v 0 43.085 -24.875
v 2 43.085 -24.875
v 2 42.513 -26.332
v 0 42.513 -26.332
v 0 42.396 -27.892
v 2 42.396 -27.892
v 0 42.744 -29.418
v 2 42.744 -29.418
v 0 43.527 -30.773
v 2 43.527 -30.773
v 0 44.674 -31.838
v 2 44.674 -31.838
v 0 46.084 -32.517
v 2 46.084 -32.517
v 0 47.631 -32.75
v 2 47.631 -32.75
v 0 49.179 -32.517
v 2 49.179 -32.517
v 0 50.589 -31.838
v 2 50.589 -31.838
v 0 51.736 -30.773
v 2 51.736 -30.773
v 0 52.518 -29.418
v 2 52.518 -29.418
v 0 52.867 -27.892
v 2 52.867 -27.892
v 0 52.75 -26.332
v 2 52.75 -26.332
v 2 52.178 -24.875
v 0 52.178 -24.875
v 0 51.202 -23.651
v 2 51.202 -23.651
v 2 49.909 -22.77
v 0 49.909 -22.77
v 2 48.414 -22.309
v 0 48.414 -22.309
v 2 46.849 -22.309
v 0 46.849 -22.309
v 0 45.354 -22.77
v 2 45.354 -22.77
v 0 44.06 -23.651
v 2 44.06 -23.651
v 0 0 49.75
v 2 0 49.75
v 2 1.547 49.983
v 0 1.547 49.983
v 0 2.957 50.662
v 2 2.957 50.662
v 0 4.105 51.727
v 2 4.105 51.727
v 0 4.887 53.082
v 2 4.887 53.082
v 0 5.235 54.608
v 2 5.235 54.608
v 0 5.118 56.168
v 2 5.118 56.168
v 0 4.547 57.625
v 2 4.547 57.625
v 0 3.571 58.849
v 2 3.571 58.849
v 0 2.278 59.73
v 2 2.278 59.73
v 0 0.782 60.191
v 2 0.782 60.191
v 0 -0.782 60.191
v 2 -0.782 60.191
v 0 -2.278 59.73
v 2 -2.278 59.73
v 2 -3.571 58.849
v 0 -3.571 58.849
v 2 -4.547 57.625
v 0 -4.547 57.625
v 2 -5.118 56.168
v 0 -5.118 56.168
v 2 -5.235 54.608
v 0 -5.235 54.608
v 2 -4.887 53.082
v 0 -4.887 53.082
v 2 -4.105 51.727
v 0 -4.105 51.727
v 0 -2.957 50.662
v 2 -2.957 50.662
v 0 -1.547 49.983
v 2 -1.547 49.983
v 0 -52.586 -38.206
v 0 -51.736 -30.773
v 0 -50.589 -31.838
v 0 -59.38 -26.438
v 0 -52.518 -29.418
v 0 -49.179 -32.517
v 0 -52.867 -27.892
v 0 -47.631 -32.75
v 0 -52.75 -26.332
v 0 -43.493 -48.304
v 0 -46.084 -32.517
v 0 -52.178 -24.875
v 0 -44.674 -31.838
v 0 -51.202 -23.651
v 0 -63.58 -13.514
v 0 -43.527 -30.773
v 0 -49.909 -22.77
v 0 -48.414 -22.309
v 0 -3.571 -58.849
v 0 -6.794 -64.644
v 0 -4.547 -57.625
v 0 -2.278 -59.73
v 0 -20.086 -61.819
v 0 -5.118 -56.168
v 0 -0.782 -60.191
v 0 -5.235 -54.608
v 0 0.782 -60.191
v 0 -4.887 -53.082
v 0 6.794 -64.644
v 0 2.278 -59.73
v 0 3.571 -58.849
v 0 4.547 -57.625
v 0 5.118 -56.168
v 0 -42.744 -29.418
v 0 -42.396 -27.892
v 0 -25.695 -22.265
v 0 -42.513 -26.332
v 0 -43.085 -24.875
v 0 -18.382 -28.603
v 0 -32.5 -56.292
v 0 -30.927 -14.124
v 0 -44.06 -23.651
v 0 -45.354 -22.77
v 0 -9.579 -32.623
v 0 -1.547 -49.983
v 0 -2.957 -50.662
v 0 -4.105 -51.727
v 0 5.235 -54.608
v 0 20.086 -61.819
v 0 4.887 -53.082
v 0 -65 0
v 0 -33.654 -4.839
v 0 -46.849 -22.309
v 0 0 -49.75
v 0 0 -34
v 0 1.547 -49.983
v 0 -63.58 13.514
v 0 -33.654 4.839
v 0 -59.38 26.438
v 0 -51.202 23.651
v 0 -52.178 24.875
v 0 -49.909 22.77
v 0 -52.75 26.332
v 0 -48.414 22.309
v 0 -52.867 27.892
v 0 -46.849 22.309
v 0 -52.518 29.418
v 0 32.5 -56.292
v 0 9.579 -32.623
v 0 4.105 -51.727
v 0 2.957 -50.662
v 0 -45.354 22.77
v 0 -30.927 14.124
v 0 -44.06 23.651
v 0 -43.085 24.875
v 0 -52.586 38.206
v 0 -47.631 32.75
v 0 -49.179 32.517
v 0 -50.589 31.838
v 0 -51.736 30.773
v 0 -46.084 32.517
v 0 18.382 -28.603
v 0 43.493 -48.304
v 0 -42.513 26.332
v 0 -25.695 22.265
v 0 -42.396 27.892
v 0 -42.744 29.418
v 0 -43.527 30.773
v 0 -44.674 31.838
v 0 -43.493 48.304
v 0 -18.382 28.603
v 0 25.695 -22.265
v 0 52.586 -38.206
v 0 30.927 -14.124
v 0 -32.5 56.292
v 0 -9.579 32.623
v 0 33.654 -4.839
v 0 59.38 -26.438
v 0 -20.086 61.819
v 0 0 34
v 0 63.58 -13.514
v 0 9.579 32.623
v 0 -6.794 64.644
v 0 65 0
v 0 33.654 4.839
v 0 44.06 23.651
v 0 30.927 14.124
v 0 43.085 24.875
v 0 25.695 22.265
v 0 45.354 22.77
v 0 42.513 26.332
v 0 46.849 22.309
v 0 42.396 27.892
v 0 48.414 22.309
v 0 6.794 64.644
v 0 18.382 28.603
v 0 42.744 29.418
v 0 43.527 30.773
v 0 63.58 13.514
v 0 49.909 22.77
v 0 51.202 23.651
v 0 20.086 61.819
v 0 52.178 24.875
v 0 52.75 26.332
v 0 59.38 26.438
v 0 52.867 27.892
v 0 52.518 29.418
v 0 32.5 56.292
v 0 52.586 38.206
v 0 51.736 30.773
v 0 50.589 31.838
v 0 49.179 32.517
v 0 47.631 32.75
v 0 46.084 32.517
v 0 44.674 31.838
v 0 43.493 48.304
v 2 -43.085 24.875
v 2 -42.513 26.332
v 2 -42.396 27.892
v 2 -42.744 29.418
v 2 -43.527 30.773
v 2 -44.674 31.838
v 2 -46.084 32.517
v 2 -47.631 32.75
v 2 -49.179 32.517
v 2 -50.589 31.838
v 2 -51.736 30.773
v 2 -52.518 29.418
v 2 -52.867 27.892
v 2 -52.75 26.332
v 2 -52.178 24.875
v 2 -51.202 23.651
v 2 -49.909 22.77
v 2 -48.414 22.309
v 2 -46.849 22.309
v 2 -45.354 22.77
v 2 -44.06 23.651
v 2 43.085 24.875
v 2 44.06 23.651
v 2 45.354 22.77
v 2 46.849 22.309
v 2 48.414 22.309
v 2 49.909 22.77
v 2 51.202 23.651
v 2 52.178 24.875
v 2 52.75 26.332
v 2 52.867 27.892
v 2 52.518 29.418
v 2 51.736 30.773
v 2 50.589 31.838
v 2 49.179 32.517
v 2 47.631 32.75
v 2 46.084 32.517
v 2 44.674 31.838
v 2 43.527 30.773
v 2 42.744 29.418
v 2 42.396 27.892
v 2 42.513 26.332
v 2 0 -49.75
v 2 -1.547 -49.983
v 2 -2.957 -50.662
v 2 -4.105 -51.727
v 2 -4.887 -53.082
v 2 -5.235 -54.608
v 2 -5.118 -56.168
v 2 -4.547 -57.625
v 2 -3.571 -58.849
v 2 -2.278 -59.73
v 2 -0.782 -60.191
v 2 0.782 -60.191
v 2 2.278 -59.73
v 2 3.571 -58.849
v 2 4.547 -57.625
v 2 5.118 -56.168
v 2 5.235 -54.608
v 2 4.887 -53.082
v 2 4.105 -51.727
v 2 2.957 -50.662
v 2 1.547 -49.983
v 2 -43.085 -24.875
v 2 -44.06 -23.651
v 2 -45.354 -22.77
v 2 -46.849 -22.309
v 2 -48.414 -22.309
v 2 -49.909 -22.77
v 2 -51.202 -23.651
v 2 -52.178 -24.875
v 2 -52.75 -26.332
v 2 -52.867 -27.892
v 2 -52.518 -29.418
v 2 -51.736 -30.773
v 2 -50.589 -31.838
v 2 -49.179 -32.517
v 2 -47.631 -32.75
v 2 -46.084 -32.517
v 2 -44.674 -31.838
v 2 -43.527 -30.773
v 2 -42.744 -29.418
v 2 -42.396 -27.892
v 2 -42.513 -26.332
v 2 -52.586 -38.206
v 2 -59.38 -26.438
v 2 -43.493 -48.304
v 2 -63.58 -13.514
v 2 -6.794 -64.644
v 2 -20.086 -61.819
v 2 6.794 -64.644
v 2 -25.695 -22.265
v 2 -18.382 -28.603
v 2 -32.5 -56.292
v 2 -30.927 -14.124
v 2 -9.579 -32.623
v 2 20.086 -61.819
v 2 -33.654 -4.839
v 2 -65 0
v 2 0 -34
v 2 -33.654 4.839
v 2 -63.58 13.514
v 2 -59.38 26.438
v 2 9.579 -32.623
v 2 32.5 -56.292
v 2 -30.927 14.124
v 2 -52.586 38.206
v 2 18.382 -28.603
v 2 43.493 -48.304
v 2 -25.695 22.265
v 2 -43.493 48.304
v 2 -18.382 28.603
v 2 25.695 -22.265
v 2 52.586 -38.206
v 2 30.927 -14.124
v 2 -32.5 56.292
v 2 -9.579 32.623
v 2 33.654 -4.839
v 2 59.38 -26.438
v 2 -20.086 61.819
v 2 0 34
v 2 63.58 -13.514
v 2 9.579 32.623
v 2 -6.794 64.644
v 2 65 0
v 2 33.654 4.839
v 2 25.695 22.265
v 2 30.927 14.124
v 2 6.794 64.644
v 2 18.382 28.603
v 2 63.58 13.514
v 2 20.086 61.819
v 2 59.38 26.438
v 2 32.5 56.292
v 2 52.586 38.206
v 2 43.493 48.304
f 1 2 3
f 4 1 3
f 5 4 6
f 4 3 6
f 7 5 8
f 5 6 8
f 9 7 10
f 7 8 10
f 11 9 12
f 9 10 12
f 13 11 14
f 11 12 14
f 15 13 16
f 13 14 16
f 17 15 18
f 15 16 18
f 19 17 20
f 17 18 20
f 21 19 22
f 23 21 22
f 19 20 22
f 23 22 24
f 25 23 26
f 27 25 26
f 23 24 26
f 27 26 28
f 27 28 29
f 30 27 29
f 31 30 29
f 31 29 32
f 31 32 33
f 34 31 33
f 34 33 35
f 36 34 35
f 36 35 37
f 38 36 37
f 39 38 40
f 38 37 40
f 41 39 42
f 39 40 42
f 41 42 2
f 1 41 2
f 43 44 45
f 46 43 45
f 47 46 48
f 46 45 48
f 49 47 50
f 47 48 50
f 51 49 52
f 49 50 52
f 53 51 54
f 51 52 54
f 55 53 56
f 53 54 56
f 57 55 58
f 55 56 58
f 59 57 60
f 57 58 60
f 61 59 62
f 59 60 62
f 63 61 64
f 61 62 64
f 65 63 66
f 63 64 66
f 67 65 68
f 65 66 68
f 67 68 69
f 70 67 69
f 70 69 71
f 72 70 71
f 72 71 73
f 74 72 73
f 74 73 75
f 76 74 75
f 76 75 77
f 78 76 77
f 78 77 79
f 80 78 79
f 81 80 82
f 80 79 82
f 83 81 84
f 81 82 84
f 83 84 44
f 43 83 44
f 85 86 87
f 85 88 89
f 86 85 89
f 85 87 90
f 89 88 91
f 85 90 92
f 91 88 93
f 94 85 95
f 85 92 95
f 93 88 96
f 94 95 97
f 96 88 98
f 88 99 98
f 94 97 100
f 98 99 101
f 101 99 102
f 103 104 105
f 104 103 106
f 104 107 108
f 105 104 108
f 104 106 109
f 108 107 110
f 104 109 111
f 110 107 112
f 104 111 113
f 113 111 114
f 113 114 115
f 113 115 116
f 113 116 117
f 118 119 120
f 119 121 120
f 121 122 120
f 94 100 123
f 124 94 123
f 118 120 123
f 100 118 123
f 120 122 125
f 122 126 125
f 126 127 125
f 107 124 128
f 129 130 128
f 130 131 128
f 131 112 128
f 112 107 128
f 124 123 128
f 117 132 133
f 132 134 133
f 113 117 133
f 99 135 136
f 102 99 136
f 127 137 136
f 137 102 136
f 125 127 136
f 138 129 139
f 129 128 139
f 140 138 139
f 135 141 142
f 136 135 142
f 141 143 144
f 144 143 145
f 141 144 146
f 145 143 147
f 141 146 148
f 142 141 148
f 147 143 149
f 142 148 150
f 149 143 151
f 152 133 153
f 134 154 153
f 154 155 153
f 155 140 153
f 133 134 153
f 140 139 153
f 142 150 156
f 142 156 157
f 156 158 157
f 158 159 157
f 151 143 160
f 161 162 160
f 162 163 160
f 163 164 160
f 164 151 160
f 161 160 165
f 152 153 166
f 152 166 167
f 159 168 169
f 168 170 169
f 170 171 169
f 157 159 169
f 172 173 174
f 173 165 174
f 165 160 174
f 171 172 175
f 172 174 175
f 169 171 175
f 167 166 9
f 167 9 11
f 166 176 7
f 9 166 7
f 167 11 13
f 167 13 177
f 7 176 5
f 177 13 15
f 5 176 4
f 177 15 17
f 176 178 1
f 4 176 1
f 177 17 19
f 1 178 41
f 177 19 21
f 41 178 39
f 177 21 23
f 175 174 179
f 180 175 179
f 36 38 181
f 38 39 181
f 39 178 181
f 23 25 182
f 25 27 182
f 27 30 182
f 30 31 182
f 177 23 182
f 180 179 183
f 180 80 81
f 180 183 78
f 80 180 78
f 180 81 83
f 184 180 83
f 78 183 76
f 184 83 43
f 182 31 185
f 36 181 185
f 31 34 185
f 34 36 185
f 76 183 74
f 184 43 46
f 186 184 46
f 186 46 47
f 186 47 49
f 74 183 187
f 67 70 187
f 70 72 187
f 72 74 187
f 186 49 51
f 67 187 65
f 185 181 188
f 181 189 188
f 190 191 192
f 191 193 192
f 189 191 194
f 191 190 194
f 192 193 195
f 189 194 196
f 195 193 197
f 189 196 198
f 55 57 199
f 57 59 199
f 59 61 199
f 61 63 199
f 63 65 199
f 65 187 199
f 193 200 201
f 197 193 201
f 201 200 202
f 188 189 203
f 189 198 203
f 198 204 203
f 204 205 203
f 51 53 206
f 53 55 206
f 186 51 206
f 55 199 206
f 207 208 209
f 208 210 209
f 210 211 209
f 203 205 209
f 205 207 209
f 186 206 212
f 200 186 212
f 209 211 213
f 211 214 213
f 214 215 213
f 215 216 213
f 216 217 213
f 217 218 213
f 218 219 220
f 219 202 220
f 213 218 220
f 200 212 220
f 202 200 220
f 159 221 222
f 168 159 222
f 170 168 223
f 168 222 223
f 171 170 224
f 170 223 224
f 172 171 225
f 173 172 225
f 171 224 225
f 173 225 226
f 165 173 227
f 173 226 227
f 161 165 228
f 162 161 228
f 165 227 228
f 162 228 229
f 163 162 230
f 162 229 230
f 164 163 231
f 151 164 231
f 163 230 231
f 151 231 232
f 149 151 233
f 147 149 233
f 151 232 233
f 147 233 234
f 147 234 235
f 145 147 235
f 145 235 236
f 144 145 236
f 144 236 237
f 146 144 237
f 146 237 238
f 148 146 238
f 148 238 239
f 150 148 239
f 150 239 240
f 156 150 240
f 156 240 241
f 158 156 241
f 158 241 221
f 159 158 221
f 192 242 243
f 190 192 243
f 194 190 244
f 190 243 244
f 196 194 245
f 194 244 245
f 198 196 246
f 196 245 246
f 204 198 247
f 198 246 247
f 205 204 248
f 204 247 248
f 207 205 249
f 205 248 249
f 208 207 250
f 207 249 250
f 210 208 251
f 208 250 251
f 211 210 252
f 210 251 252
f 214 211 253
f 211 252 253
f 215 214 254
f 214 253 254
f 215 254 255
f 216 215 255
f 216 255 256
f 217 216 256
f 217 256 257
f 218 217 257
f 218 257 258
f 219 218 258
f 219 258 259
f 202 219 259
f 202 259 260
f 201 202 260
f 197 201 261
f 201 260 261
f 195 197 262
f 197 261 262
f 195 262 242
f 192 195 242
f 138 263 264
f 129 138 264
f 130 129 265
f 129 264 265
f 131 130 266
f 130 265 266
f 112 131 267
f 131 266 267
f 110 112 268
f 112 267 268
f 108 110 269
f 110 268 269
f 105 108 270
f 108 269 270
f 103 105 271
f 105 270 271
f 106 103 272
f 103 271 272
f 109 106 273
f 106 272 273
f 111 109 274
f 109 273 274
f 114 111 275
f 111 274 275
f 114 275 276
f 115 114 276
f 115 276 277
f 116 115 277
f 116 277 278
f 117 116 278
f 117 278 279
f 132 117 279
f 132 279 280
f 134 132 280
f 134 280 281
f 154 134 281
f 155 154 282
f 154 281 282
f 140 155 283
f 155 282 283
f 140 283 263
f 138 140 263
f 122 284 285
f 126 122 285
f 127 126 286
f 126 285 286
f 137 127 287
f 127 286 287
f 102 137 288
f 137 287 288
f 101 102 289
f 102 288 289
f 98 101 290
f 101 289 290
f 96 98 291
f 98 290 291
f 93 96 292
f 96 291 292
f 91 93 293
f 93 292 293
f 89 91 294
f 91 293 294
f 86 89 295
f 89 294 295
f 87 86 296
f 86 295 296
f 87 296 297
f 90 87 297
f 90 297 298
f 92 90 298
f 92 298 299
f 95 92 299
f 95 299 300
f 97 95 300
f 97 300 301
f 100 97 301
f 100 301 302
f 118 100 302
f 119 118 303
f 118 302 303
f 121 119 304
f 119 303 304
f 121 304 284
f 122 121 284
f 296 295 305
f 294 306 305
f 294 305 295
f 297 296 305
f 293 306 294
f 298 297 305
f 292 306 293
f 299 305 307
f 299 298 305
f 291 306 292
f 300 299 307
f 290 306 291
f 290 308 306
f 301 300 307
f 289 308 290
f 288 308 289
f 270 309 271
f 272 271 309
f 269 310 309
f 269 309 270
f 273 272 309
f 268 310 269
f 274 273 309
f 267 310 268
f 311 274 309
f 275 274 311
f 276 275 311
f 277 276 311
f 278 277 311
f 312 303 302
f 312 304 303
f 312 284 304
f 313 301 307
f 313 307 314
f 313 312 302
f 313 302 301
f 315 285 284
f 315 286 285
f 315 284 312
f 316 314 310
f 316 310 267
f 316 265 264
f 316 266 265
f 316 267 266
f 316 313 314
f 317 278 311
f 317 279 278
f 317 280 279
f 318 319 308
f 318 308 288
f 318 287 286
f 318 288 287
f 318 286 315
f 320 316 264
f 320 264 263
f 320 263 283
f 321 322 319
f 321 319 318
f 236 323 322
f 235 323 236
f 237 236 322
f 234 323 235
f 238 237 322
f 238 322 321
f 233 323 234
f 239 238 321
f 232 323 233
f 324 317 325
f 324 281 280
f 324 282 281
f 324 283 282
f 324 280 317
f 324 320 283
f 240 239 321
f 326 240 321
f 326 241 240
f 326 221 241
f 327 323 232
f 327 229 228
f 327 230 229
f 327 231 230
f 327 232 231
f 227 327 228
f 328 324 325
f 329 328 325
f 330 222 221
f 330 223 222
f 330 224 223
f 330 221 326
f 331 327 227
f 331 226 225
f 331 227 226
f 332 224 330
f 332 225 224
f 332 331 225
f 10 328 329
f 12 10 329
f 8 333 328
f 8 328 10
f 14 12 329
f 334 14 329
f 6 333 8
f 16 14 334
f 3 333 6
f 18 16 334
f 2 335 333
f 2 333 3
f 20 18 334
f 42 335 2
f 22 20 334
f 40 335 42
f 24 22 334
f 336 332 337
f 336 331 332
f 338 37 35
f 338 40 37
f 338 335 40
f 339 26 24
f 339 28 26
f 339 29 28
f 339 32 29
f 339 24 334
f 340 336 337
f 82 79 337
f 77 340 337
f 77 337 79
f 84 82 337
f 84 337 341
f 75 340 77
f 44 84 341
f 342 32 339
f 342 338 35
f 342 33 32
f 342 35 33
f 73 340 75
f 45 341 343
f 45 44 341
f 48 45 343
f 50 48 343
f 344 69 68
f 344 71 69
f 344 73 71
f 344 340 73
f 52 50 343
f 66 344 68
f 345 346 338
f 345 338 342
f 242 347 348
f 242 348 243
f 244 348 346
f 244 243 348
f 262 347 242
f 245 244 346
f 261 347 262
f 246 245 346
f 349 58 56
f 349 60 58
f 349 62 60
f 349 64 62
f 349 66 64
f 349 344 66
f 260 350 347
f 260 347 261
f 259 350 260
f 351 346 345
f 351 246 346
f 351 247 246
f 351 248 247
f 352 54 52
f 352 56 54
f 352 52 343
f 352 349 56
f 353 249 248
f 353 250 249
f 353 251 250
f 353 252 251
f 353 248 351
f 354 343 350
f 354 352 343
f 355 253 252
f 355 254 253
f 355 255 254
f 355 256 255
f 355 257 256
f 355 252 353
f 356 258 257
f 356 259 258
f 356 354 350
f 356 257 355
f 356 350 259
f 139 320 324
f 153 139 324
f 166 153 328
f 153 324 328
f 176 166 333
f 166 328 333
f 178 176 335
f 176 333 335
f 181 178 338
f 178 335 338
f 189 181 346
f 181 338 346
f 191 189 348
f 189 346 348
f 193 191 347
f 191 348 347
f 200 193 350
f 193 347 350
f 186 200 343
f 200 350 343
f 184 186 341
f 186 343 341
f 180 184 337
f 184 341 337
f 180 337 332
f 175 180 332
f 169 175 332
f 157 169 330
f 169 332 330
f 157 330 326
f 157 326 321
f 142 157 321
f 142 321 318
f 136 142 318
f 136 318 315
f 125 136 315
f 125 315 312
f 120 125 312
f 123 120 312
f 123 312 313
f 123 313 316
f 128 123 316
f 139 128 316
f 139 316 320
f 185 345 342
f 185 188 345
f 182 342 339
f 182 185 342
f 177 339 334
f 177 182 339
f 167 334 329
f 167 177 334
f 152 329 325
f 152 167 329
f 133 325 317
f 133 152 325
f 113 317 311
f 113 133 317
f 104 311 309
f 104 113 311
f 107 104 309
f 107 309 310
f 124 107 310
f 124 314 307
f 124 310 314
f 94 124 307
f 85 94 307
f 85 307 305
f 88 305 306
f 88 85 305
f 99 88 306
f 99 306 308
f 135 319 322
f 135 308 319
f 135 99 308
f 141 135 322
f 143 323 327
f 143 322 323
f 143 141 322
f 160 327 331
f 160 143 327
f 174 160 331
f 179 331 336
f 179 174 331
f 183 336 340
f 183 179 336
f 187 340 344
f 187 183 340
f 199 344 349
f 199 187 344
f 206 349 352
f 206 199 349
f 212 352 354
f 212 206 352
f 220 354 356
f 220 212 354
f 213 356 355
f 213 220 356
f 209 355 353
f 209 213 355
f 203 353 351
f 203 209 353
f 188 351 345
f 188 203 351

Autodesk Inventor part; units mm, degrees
ref_plane "YZ Plane" through (0, 0, 0) normal (1, 0, 0) x (0, 1, 0)
ref_plane "XZ Plane" through (0, 0, 0) normal (0, 1, 0) x (-1, 0, 0)
ref_plane "XY Plane" through (0, 0, 0) normal (0, 0, 1) x (1, 0, 0)
sketch "Sketch1" plane through (0, 0, 0) normal (1, 0, 0) x (0, 1, 0)
  circle A0 centre (0, 0) radius 65
  dimension "d0" = 130
extrude "Extrusion1" add sketch "Sketch1" along normal blind 2
sketch "Sketch2" plane through (0, 0, 0) normal (-1, 0, 0) x (0, 0, 1)
  circle A0 centre (0, 0) radius 55
  circle A1 centre (-55, 0) radius 5.25
  dimension "d3" = 110
  dimension "d4" = 10.5
hole "Hole1" at (0, 0, -55) direction (1, 0, 0) diameter 10.5 end through all
pattern_circular "Circular Pattern1" count 6 over 360 about axis through (0, 0, 0) along (1, 0, 0) of "Hole1"
sketch "Sketch3" plane through (2, 0, 0) normal (1, 0, 0) x (0, 0, -1)
  circle A0 centre (0, 0) radius 34
  dimension "d15" = 68
extrude "Extrusion2" cut sketch "Sketch3" against normal blind 10
properties part number "04_Dem_dieu_chinh"
